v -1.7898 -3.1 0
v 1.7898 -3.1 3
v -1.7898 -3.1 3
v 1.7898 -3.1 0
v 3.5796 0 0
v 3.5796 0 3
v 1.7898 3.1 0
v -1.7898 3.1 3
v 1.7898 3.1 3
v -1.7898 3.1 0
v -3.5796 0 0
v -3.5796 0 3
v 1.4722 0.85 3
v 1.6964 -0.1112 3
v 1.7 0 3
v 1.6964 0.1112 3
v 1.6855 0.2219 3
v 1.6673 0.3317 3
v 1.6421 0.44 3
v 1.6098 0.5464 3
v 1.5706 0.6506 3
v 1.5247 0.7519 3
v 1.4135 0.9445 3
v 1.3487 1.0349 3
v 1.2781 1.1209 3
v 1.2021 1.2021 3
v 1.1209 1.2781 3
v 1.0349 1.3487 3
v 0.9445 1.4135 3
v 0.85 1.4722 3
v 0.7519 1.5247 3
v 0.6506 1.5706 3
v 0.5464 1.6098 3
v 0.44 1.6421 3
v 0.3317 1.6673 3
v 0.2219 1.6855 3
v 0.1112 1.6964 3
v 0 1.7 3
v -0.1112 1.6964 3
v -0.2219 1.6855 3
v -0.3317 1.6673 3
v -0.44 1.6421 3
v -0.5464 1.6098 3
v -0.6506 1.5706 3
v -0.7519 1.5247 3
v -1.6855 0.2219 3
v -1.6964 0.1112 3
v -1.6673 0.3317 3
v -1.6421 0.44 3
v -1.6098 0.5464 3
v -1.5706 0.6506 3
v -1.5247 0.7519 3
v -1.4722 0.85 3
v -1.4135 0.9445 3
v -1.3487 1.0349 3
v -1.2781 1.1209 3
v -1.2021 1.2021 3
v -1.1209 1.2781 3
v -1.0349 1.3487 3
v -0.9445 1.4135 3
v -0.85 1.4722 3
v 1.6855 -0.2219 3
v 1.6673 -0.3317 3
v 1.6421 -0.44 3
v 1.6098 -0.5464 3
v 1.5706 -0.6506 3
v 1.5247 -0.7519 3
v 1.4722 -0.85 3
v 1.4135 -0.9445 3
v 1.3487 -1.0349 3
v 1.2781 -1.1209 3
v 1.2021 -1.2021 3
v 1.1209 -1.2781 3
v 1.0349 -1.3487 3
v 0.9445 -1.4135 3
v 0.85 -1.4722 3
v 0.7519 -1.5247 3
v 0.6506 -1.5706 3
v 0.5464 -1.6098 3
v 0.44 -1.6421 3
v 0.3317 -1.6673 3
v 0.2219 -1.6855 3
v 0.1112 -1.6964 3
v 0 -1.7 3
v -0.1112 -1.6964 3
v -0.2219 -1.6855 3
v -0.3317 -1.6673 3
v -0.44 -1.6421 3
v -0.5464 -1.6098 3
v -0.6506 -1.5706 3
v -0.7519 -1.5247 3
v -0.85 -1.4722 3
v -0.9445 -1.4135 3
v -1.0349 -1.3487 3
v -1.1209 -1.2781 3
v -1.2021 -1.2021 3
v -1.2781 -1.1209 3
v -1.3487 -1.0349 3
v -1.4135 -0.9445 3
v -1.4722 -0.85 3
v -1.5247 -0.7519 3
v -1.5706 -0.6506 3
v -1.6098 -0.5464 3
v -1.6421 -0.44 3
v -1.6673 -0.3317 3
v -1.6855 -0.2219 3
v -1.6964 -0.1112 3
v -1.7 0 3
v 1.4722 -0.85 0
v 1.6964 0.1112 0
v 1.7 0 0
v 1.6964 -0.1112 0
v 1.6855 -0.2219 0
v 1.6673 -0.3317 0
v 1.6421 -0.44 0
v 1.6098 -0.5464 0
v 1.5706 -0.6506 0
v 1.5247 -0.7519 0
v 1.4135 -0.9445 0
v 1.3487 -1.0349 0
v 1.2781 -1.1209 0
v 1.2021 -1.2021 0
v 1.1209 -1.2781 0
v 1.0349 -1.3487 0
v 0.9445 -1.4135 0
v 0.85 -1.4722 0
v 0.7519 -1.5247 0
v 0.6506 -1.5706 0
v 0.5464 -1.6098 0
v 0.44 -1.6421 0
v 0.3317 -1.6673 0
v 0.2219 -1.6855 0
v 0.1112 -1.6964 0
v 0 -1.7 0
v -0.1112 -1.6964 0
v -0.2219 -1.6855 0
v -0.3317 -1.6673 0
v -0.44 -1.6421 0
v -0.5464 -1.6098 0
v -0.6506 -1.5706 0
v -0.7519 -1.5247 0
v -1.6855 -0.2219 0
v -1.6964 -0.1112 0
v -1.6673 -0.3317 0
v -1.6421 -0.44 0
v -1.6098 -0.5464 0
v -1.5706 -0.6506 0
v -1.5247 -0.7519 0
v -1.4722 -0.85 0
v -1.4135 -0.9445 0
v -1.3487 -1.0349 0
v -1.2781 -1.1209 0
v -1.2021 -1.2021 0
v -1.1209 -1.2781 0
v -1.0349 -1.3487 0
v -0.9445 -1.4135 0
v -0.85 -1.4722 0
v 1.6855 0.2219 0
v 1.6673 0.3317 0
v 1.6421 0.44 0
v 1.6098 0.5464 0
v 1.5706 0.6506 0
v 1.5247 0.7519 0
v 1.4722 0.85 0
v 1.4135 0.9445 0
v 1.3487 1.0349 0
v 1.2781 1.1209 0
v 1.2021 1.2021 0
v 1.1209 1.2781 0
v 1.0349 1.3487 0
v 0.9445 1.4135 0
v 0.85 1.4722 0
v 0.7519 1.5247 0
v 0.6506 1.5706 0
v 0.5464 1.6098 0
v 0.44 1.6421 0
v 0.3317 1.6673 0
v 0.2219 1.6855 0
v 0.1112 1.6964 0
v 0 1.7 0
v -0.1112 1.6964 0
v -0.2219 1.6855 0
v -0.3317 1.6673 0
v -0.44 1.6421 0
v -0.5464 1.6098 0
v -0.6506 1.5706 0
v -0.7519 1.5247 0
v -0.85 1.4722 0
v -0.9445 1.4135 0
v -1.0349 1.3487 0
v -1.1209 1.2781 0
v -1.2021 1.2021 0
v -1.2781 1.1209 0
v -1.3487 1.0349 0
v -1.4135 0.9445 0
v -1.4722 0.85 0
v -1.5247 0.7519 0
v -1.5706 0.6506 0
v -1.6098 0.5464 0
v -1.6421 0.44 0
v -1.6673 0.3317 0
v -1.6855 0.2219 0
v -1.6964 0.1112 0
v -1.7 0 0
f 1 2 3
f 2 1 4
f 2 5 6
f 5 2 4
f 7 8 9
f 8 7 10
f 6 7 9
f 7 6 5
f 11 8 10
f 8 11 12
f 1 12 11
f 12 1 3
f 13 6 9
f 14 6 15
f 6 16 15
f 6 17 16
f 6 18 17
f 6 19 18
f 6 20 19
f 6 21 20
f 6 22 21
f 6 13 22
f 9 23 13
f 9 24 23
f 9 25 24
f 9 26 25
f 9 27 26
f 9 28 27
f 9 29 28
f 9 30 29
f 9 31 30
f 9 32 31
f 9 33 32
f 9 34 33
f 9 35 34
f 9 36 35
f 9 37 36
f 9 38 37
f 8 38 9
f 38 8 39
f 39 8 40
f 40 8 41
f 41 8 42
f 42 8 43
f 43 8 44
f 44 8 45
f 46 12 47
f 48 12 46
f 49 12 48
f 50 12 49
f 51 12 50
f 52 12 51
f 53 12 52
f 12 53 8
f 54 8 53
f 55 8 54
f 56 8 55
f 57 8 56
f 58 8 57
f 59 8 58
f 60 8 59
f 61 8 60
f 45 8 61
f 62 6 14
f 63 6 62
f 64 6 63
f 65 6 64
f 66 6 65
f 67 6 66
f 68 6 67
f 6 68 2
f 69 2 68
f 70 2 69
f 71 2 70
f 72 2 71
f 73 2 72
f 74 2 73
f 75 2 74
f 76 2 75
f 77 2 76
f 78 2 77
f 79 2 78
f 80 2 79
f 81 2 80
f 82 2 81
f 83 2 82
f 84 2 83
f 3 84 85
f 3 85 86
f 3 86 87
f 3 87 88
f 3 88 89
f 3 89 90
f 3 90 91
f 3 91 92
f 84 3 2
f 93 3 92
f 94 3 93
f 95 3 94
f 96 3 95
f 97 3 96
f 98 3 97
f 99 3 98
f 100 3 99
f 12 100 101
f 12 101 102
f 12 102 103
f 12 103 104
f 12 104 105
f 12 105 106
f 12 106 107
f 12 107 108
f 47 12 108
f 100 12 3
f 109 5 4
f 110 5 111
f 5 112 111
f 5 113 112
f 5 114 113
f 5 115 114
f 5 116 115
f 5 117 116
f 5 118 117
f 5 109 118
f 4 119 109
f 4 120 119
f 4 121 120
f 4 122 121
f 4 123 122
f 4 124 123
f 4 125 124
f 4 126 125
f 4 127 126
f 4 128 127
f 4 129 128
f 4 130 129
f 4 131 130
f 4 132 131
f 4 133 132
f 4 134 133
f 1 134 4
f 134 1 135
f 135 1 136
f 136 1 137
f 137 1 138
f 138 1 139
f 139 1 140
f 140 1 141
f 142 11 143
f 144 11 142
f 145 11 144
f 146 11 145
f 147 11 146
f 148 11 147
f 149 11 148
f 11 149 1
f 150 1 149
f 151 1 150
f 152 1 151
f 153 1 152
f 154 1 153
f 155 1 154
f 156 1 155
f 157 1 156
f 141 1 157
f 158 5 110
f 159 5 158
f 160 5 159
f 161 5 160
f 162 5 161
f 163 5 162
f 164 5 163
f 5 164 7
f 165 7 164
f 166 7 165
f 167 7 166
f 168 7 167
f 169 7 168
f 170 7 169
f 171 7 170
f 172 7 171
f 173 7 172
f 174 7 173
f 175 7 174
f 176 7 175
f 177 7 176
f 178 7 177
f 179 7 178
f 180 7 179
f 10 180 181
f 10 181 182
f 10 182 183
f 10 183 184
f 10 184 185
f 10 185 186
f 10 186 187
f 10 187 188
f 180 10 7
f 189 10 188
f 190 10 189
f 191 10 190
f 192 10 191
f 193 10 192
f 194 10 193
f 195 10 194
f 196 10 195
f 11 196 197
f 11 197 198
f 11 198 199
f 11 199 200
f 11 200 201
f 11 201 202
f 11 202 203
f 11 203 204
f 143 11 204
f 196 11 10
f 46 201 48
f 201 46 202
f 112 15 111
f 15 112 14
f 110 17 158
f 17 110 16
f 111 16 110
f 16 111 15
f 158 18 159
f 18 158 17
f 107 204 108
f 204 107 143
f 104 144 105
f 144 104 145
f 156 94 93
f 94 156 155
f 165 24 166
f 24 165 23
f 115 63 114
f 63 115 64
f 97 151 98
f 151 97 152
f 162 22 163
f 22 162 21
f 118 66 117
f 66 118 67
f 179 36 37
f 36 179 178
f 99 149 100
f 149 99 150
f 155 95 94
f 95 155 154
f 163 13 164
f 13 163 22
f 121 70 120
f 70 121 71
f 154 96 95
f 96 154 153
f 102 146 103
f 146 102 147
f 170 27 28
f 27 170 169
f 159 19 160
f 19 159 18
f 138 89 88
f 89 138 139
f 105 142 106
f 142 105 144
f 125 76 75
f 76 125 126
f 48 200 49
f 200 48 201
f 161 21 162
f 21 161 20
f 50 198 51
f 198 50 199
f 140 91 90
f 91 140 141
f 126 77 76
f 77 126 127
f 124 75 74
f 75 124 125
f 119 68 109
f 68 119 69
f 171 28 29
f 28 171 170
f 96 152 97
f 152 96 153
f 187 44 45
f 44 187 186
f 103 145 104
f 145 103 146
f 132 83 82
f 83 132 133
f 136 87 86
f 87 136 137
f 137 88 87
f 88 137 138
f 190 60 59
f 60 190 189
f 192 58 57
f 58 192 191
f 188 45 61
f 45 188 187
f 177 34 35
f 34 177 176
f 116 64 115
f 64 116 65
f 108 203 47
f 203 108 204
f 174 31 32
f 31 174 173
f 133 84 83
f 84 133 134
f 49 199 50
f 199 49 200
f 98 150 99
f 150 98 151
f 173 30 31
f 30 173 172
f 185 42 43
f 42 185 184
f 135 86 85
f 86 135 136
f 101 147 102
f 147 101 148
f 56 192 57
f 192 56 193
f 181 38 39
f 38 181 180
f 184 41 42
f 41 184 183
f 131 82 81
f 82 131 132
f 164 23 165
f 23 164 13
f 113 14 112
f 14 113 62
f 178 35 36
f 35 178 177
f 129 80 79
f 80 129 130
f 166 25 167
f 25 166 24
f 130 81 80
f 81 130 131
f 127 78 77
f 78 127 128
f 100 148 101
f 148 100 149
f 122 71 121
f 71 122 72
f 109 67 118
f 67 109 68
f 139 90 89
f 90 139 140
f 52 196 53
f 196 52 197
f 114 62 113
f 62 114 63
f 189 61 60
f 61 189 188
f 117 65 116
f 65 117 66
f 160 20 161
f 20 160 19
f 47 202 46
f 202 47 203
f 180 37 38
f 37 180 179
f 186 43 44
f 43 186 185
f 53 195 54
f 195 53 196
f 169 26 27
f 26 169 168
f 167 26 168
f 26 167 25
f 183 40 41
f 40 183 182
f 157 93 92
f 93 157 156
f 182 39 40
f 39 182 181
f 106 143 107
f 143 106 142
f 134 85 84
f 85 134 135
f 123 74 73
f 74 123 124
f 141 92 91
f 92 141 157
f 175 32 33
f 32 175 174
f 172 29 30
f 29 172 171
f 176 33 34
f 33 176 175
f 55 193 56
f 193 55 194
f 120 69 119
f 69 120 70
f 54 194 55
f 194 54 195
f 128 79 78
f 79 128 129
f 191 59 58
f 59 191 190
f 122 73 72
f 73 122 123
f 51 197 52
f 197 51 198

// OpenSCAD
$fn = 96;

// T-slot nut parameters (mm)
screw_d = 3.0;          // for M3 clearance
across_flats = 6.0;     // hex across flats
thickness = 3.0;        // nut thickness

// Practical clearances
hole_d = 3.4;           // M3 clearance
hex_af = across_flats + 0.2; // slight oversize for print tolerance

module hex_prism_af(af, h){
    // For a regular hexagon: across_flats = 2 * apothem = sqrt(3) * R
    // where R is circumradius (center to vertex)
    R = af / sqrt(3);
    cylinder(h=h, r=R, $fn=6);
}

difference() {
    hex_prism_af(hex_af, thickness);
    translate([0,0,-0.2]) cylinder(h=thickness+0.4, d=hole_d);
}
